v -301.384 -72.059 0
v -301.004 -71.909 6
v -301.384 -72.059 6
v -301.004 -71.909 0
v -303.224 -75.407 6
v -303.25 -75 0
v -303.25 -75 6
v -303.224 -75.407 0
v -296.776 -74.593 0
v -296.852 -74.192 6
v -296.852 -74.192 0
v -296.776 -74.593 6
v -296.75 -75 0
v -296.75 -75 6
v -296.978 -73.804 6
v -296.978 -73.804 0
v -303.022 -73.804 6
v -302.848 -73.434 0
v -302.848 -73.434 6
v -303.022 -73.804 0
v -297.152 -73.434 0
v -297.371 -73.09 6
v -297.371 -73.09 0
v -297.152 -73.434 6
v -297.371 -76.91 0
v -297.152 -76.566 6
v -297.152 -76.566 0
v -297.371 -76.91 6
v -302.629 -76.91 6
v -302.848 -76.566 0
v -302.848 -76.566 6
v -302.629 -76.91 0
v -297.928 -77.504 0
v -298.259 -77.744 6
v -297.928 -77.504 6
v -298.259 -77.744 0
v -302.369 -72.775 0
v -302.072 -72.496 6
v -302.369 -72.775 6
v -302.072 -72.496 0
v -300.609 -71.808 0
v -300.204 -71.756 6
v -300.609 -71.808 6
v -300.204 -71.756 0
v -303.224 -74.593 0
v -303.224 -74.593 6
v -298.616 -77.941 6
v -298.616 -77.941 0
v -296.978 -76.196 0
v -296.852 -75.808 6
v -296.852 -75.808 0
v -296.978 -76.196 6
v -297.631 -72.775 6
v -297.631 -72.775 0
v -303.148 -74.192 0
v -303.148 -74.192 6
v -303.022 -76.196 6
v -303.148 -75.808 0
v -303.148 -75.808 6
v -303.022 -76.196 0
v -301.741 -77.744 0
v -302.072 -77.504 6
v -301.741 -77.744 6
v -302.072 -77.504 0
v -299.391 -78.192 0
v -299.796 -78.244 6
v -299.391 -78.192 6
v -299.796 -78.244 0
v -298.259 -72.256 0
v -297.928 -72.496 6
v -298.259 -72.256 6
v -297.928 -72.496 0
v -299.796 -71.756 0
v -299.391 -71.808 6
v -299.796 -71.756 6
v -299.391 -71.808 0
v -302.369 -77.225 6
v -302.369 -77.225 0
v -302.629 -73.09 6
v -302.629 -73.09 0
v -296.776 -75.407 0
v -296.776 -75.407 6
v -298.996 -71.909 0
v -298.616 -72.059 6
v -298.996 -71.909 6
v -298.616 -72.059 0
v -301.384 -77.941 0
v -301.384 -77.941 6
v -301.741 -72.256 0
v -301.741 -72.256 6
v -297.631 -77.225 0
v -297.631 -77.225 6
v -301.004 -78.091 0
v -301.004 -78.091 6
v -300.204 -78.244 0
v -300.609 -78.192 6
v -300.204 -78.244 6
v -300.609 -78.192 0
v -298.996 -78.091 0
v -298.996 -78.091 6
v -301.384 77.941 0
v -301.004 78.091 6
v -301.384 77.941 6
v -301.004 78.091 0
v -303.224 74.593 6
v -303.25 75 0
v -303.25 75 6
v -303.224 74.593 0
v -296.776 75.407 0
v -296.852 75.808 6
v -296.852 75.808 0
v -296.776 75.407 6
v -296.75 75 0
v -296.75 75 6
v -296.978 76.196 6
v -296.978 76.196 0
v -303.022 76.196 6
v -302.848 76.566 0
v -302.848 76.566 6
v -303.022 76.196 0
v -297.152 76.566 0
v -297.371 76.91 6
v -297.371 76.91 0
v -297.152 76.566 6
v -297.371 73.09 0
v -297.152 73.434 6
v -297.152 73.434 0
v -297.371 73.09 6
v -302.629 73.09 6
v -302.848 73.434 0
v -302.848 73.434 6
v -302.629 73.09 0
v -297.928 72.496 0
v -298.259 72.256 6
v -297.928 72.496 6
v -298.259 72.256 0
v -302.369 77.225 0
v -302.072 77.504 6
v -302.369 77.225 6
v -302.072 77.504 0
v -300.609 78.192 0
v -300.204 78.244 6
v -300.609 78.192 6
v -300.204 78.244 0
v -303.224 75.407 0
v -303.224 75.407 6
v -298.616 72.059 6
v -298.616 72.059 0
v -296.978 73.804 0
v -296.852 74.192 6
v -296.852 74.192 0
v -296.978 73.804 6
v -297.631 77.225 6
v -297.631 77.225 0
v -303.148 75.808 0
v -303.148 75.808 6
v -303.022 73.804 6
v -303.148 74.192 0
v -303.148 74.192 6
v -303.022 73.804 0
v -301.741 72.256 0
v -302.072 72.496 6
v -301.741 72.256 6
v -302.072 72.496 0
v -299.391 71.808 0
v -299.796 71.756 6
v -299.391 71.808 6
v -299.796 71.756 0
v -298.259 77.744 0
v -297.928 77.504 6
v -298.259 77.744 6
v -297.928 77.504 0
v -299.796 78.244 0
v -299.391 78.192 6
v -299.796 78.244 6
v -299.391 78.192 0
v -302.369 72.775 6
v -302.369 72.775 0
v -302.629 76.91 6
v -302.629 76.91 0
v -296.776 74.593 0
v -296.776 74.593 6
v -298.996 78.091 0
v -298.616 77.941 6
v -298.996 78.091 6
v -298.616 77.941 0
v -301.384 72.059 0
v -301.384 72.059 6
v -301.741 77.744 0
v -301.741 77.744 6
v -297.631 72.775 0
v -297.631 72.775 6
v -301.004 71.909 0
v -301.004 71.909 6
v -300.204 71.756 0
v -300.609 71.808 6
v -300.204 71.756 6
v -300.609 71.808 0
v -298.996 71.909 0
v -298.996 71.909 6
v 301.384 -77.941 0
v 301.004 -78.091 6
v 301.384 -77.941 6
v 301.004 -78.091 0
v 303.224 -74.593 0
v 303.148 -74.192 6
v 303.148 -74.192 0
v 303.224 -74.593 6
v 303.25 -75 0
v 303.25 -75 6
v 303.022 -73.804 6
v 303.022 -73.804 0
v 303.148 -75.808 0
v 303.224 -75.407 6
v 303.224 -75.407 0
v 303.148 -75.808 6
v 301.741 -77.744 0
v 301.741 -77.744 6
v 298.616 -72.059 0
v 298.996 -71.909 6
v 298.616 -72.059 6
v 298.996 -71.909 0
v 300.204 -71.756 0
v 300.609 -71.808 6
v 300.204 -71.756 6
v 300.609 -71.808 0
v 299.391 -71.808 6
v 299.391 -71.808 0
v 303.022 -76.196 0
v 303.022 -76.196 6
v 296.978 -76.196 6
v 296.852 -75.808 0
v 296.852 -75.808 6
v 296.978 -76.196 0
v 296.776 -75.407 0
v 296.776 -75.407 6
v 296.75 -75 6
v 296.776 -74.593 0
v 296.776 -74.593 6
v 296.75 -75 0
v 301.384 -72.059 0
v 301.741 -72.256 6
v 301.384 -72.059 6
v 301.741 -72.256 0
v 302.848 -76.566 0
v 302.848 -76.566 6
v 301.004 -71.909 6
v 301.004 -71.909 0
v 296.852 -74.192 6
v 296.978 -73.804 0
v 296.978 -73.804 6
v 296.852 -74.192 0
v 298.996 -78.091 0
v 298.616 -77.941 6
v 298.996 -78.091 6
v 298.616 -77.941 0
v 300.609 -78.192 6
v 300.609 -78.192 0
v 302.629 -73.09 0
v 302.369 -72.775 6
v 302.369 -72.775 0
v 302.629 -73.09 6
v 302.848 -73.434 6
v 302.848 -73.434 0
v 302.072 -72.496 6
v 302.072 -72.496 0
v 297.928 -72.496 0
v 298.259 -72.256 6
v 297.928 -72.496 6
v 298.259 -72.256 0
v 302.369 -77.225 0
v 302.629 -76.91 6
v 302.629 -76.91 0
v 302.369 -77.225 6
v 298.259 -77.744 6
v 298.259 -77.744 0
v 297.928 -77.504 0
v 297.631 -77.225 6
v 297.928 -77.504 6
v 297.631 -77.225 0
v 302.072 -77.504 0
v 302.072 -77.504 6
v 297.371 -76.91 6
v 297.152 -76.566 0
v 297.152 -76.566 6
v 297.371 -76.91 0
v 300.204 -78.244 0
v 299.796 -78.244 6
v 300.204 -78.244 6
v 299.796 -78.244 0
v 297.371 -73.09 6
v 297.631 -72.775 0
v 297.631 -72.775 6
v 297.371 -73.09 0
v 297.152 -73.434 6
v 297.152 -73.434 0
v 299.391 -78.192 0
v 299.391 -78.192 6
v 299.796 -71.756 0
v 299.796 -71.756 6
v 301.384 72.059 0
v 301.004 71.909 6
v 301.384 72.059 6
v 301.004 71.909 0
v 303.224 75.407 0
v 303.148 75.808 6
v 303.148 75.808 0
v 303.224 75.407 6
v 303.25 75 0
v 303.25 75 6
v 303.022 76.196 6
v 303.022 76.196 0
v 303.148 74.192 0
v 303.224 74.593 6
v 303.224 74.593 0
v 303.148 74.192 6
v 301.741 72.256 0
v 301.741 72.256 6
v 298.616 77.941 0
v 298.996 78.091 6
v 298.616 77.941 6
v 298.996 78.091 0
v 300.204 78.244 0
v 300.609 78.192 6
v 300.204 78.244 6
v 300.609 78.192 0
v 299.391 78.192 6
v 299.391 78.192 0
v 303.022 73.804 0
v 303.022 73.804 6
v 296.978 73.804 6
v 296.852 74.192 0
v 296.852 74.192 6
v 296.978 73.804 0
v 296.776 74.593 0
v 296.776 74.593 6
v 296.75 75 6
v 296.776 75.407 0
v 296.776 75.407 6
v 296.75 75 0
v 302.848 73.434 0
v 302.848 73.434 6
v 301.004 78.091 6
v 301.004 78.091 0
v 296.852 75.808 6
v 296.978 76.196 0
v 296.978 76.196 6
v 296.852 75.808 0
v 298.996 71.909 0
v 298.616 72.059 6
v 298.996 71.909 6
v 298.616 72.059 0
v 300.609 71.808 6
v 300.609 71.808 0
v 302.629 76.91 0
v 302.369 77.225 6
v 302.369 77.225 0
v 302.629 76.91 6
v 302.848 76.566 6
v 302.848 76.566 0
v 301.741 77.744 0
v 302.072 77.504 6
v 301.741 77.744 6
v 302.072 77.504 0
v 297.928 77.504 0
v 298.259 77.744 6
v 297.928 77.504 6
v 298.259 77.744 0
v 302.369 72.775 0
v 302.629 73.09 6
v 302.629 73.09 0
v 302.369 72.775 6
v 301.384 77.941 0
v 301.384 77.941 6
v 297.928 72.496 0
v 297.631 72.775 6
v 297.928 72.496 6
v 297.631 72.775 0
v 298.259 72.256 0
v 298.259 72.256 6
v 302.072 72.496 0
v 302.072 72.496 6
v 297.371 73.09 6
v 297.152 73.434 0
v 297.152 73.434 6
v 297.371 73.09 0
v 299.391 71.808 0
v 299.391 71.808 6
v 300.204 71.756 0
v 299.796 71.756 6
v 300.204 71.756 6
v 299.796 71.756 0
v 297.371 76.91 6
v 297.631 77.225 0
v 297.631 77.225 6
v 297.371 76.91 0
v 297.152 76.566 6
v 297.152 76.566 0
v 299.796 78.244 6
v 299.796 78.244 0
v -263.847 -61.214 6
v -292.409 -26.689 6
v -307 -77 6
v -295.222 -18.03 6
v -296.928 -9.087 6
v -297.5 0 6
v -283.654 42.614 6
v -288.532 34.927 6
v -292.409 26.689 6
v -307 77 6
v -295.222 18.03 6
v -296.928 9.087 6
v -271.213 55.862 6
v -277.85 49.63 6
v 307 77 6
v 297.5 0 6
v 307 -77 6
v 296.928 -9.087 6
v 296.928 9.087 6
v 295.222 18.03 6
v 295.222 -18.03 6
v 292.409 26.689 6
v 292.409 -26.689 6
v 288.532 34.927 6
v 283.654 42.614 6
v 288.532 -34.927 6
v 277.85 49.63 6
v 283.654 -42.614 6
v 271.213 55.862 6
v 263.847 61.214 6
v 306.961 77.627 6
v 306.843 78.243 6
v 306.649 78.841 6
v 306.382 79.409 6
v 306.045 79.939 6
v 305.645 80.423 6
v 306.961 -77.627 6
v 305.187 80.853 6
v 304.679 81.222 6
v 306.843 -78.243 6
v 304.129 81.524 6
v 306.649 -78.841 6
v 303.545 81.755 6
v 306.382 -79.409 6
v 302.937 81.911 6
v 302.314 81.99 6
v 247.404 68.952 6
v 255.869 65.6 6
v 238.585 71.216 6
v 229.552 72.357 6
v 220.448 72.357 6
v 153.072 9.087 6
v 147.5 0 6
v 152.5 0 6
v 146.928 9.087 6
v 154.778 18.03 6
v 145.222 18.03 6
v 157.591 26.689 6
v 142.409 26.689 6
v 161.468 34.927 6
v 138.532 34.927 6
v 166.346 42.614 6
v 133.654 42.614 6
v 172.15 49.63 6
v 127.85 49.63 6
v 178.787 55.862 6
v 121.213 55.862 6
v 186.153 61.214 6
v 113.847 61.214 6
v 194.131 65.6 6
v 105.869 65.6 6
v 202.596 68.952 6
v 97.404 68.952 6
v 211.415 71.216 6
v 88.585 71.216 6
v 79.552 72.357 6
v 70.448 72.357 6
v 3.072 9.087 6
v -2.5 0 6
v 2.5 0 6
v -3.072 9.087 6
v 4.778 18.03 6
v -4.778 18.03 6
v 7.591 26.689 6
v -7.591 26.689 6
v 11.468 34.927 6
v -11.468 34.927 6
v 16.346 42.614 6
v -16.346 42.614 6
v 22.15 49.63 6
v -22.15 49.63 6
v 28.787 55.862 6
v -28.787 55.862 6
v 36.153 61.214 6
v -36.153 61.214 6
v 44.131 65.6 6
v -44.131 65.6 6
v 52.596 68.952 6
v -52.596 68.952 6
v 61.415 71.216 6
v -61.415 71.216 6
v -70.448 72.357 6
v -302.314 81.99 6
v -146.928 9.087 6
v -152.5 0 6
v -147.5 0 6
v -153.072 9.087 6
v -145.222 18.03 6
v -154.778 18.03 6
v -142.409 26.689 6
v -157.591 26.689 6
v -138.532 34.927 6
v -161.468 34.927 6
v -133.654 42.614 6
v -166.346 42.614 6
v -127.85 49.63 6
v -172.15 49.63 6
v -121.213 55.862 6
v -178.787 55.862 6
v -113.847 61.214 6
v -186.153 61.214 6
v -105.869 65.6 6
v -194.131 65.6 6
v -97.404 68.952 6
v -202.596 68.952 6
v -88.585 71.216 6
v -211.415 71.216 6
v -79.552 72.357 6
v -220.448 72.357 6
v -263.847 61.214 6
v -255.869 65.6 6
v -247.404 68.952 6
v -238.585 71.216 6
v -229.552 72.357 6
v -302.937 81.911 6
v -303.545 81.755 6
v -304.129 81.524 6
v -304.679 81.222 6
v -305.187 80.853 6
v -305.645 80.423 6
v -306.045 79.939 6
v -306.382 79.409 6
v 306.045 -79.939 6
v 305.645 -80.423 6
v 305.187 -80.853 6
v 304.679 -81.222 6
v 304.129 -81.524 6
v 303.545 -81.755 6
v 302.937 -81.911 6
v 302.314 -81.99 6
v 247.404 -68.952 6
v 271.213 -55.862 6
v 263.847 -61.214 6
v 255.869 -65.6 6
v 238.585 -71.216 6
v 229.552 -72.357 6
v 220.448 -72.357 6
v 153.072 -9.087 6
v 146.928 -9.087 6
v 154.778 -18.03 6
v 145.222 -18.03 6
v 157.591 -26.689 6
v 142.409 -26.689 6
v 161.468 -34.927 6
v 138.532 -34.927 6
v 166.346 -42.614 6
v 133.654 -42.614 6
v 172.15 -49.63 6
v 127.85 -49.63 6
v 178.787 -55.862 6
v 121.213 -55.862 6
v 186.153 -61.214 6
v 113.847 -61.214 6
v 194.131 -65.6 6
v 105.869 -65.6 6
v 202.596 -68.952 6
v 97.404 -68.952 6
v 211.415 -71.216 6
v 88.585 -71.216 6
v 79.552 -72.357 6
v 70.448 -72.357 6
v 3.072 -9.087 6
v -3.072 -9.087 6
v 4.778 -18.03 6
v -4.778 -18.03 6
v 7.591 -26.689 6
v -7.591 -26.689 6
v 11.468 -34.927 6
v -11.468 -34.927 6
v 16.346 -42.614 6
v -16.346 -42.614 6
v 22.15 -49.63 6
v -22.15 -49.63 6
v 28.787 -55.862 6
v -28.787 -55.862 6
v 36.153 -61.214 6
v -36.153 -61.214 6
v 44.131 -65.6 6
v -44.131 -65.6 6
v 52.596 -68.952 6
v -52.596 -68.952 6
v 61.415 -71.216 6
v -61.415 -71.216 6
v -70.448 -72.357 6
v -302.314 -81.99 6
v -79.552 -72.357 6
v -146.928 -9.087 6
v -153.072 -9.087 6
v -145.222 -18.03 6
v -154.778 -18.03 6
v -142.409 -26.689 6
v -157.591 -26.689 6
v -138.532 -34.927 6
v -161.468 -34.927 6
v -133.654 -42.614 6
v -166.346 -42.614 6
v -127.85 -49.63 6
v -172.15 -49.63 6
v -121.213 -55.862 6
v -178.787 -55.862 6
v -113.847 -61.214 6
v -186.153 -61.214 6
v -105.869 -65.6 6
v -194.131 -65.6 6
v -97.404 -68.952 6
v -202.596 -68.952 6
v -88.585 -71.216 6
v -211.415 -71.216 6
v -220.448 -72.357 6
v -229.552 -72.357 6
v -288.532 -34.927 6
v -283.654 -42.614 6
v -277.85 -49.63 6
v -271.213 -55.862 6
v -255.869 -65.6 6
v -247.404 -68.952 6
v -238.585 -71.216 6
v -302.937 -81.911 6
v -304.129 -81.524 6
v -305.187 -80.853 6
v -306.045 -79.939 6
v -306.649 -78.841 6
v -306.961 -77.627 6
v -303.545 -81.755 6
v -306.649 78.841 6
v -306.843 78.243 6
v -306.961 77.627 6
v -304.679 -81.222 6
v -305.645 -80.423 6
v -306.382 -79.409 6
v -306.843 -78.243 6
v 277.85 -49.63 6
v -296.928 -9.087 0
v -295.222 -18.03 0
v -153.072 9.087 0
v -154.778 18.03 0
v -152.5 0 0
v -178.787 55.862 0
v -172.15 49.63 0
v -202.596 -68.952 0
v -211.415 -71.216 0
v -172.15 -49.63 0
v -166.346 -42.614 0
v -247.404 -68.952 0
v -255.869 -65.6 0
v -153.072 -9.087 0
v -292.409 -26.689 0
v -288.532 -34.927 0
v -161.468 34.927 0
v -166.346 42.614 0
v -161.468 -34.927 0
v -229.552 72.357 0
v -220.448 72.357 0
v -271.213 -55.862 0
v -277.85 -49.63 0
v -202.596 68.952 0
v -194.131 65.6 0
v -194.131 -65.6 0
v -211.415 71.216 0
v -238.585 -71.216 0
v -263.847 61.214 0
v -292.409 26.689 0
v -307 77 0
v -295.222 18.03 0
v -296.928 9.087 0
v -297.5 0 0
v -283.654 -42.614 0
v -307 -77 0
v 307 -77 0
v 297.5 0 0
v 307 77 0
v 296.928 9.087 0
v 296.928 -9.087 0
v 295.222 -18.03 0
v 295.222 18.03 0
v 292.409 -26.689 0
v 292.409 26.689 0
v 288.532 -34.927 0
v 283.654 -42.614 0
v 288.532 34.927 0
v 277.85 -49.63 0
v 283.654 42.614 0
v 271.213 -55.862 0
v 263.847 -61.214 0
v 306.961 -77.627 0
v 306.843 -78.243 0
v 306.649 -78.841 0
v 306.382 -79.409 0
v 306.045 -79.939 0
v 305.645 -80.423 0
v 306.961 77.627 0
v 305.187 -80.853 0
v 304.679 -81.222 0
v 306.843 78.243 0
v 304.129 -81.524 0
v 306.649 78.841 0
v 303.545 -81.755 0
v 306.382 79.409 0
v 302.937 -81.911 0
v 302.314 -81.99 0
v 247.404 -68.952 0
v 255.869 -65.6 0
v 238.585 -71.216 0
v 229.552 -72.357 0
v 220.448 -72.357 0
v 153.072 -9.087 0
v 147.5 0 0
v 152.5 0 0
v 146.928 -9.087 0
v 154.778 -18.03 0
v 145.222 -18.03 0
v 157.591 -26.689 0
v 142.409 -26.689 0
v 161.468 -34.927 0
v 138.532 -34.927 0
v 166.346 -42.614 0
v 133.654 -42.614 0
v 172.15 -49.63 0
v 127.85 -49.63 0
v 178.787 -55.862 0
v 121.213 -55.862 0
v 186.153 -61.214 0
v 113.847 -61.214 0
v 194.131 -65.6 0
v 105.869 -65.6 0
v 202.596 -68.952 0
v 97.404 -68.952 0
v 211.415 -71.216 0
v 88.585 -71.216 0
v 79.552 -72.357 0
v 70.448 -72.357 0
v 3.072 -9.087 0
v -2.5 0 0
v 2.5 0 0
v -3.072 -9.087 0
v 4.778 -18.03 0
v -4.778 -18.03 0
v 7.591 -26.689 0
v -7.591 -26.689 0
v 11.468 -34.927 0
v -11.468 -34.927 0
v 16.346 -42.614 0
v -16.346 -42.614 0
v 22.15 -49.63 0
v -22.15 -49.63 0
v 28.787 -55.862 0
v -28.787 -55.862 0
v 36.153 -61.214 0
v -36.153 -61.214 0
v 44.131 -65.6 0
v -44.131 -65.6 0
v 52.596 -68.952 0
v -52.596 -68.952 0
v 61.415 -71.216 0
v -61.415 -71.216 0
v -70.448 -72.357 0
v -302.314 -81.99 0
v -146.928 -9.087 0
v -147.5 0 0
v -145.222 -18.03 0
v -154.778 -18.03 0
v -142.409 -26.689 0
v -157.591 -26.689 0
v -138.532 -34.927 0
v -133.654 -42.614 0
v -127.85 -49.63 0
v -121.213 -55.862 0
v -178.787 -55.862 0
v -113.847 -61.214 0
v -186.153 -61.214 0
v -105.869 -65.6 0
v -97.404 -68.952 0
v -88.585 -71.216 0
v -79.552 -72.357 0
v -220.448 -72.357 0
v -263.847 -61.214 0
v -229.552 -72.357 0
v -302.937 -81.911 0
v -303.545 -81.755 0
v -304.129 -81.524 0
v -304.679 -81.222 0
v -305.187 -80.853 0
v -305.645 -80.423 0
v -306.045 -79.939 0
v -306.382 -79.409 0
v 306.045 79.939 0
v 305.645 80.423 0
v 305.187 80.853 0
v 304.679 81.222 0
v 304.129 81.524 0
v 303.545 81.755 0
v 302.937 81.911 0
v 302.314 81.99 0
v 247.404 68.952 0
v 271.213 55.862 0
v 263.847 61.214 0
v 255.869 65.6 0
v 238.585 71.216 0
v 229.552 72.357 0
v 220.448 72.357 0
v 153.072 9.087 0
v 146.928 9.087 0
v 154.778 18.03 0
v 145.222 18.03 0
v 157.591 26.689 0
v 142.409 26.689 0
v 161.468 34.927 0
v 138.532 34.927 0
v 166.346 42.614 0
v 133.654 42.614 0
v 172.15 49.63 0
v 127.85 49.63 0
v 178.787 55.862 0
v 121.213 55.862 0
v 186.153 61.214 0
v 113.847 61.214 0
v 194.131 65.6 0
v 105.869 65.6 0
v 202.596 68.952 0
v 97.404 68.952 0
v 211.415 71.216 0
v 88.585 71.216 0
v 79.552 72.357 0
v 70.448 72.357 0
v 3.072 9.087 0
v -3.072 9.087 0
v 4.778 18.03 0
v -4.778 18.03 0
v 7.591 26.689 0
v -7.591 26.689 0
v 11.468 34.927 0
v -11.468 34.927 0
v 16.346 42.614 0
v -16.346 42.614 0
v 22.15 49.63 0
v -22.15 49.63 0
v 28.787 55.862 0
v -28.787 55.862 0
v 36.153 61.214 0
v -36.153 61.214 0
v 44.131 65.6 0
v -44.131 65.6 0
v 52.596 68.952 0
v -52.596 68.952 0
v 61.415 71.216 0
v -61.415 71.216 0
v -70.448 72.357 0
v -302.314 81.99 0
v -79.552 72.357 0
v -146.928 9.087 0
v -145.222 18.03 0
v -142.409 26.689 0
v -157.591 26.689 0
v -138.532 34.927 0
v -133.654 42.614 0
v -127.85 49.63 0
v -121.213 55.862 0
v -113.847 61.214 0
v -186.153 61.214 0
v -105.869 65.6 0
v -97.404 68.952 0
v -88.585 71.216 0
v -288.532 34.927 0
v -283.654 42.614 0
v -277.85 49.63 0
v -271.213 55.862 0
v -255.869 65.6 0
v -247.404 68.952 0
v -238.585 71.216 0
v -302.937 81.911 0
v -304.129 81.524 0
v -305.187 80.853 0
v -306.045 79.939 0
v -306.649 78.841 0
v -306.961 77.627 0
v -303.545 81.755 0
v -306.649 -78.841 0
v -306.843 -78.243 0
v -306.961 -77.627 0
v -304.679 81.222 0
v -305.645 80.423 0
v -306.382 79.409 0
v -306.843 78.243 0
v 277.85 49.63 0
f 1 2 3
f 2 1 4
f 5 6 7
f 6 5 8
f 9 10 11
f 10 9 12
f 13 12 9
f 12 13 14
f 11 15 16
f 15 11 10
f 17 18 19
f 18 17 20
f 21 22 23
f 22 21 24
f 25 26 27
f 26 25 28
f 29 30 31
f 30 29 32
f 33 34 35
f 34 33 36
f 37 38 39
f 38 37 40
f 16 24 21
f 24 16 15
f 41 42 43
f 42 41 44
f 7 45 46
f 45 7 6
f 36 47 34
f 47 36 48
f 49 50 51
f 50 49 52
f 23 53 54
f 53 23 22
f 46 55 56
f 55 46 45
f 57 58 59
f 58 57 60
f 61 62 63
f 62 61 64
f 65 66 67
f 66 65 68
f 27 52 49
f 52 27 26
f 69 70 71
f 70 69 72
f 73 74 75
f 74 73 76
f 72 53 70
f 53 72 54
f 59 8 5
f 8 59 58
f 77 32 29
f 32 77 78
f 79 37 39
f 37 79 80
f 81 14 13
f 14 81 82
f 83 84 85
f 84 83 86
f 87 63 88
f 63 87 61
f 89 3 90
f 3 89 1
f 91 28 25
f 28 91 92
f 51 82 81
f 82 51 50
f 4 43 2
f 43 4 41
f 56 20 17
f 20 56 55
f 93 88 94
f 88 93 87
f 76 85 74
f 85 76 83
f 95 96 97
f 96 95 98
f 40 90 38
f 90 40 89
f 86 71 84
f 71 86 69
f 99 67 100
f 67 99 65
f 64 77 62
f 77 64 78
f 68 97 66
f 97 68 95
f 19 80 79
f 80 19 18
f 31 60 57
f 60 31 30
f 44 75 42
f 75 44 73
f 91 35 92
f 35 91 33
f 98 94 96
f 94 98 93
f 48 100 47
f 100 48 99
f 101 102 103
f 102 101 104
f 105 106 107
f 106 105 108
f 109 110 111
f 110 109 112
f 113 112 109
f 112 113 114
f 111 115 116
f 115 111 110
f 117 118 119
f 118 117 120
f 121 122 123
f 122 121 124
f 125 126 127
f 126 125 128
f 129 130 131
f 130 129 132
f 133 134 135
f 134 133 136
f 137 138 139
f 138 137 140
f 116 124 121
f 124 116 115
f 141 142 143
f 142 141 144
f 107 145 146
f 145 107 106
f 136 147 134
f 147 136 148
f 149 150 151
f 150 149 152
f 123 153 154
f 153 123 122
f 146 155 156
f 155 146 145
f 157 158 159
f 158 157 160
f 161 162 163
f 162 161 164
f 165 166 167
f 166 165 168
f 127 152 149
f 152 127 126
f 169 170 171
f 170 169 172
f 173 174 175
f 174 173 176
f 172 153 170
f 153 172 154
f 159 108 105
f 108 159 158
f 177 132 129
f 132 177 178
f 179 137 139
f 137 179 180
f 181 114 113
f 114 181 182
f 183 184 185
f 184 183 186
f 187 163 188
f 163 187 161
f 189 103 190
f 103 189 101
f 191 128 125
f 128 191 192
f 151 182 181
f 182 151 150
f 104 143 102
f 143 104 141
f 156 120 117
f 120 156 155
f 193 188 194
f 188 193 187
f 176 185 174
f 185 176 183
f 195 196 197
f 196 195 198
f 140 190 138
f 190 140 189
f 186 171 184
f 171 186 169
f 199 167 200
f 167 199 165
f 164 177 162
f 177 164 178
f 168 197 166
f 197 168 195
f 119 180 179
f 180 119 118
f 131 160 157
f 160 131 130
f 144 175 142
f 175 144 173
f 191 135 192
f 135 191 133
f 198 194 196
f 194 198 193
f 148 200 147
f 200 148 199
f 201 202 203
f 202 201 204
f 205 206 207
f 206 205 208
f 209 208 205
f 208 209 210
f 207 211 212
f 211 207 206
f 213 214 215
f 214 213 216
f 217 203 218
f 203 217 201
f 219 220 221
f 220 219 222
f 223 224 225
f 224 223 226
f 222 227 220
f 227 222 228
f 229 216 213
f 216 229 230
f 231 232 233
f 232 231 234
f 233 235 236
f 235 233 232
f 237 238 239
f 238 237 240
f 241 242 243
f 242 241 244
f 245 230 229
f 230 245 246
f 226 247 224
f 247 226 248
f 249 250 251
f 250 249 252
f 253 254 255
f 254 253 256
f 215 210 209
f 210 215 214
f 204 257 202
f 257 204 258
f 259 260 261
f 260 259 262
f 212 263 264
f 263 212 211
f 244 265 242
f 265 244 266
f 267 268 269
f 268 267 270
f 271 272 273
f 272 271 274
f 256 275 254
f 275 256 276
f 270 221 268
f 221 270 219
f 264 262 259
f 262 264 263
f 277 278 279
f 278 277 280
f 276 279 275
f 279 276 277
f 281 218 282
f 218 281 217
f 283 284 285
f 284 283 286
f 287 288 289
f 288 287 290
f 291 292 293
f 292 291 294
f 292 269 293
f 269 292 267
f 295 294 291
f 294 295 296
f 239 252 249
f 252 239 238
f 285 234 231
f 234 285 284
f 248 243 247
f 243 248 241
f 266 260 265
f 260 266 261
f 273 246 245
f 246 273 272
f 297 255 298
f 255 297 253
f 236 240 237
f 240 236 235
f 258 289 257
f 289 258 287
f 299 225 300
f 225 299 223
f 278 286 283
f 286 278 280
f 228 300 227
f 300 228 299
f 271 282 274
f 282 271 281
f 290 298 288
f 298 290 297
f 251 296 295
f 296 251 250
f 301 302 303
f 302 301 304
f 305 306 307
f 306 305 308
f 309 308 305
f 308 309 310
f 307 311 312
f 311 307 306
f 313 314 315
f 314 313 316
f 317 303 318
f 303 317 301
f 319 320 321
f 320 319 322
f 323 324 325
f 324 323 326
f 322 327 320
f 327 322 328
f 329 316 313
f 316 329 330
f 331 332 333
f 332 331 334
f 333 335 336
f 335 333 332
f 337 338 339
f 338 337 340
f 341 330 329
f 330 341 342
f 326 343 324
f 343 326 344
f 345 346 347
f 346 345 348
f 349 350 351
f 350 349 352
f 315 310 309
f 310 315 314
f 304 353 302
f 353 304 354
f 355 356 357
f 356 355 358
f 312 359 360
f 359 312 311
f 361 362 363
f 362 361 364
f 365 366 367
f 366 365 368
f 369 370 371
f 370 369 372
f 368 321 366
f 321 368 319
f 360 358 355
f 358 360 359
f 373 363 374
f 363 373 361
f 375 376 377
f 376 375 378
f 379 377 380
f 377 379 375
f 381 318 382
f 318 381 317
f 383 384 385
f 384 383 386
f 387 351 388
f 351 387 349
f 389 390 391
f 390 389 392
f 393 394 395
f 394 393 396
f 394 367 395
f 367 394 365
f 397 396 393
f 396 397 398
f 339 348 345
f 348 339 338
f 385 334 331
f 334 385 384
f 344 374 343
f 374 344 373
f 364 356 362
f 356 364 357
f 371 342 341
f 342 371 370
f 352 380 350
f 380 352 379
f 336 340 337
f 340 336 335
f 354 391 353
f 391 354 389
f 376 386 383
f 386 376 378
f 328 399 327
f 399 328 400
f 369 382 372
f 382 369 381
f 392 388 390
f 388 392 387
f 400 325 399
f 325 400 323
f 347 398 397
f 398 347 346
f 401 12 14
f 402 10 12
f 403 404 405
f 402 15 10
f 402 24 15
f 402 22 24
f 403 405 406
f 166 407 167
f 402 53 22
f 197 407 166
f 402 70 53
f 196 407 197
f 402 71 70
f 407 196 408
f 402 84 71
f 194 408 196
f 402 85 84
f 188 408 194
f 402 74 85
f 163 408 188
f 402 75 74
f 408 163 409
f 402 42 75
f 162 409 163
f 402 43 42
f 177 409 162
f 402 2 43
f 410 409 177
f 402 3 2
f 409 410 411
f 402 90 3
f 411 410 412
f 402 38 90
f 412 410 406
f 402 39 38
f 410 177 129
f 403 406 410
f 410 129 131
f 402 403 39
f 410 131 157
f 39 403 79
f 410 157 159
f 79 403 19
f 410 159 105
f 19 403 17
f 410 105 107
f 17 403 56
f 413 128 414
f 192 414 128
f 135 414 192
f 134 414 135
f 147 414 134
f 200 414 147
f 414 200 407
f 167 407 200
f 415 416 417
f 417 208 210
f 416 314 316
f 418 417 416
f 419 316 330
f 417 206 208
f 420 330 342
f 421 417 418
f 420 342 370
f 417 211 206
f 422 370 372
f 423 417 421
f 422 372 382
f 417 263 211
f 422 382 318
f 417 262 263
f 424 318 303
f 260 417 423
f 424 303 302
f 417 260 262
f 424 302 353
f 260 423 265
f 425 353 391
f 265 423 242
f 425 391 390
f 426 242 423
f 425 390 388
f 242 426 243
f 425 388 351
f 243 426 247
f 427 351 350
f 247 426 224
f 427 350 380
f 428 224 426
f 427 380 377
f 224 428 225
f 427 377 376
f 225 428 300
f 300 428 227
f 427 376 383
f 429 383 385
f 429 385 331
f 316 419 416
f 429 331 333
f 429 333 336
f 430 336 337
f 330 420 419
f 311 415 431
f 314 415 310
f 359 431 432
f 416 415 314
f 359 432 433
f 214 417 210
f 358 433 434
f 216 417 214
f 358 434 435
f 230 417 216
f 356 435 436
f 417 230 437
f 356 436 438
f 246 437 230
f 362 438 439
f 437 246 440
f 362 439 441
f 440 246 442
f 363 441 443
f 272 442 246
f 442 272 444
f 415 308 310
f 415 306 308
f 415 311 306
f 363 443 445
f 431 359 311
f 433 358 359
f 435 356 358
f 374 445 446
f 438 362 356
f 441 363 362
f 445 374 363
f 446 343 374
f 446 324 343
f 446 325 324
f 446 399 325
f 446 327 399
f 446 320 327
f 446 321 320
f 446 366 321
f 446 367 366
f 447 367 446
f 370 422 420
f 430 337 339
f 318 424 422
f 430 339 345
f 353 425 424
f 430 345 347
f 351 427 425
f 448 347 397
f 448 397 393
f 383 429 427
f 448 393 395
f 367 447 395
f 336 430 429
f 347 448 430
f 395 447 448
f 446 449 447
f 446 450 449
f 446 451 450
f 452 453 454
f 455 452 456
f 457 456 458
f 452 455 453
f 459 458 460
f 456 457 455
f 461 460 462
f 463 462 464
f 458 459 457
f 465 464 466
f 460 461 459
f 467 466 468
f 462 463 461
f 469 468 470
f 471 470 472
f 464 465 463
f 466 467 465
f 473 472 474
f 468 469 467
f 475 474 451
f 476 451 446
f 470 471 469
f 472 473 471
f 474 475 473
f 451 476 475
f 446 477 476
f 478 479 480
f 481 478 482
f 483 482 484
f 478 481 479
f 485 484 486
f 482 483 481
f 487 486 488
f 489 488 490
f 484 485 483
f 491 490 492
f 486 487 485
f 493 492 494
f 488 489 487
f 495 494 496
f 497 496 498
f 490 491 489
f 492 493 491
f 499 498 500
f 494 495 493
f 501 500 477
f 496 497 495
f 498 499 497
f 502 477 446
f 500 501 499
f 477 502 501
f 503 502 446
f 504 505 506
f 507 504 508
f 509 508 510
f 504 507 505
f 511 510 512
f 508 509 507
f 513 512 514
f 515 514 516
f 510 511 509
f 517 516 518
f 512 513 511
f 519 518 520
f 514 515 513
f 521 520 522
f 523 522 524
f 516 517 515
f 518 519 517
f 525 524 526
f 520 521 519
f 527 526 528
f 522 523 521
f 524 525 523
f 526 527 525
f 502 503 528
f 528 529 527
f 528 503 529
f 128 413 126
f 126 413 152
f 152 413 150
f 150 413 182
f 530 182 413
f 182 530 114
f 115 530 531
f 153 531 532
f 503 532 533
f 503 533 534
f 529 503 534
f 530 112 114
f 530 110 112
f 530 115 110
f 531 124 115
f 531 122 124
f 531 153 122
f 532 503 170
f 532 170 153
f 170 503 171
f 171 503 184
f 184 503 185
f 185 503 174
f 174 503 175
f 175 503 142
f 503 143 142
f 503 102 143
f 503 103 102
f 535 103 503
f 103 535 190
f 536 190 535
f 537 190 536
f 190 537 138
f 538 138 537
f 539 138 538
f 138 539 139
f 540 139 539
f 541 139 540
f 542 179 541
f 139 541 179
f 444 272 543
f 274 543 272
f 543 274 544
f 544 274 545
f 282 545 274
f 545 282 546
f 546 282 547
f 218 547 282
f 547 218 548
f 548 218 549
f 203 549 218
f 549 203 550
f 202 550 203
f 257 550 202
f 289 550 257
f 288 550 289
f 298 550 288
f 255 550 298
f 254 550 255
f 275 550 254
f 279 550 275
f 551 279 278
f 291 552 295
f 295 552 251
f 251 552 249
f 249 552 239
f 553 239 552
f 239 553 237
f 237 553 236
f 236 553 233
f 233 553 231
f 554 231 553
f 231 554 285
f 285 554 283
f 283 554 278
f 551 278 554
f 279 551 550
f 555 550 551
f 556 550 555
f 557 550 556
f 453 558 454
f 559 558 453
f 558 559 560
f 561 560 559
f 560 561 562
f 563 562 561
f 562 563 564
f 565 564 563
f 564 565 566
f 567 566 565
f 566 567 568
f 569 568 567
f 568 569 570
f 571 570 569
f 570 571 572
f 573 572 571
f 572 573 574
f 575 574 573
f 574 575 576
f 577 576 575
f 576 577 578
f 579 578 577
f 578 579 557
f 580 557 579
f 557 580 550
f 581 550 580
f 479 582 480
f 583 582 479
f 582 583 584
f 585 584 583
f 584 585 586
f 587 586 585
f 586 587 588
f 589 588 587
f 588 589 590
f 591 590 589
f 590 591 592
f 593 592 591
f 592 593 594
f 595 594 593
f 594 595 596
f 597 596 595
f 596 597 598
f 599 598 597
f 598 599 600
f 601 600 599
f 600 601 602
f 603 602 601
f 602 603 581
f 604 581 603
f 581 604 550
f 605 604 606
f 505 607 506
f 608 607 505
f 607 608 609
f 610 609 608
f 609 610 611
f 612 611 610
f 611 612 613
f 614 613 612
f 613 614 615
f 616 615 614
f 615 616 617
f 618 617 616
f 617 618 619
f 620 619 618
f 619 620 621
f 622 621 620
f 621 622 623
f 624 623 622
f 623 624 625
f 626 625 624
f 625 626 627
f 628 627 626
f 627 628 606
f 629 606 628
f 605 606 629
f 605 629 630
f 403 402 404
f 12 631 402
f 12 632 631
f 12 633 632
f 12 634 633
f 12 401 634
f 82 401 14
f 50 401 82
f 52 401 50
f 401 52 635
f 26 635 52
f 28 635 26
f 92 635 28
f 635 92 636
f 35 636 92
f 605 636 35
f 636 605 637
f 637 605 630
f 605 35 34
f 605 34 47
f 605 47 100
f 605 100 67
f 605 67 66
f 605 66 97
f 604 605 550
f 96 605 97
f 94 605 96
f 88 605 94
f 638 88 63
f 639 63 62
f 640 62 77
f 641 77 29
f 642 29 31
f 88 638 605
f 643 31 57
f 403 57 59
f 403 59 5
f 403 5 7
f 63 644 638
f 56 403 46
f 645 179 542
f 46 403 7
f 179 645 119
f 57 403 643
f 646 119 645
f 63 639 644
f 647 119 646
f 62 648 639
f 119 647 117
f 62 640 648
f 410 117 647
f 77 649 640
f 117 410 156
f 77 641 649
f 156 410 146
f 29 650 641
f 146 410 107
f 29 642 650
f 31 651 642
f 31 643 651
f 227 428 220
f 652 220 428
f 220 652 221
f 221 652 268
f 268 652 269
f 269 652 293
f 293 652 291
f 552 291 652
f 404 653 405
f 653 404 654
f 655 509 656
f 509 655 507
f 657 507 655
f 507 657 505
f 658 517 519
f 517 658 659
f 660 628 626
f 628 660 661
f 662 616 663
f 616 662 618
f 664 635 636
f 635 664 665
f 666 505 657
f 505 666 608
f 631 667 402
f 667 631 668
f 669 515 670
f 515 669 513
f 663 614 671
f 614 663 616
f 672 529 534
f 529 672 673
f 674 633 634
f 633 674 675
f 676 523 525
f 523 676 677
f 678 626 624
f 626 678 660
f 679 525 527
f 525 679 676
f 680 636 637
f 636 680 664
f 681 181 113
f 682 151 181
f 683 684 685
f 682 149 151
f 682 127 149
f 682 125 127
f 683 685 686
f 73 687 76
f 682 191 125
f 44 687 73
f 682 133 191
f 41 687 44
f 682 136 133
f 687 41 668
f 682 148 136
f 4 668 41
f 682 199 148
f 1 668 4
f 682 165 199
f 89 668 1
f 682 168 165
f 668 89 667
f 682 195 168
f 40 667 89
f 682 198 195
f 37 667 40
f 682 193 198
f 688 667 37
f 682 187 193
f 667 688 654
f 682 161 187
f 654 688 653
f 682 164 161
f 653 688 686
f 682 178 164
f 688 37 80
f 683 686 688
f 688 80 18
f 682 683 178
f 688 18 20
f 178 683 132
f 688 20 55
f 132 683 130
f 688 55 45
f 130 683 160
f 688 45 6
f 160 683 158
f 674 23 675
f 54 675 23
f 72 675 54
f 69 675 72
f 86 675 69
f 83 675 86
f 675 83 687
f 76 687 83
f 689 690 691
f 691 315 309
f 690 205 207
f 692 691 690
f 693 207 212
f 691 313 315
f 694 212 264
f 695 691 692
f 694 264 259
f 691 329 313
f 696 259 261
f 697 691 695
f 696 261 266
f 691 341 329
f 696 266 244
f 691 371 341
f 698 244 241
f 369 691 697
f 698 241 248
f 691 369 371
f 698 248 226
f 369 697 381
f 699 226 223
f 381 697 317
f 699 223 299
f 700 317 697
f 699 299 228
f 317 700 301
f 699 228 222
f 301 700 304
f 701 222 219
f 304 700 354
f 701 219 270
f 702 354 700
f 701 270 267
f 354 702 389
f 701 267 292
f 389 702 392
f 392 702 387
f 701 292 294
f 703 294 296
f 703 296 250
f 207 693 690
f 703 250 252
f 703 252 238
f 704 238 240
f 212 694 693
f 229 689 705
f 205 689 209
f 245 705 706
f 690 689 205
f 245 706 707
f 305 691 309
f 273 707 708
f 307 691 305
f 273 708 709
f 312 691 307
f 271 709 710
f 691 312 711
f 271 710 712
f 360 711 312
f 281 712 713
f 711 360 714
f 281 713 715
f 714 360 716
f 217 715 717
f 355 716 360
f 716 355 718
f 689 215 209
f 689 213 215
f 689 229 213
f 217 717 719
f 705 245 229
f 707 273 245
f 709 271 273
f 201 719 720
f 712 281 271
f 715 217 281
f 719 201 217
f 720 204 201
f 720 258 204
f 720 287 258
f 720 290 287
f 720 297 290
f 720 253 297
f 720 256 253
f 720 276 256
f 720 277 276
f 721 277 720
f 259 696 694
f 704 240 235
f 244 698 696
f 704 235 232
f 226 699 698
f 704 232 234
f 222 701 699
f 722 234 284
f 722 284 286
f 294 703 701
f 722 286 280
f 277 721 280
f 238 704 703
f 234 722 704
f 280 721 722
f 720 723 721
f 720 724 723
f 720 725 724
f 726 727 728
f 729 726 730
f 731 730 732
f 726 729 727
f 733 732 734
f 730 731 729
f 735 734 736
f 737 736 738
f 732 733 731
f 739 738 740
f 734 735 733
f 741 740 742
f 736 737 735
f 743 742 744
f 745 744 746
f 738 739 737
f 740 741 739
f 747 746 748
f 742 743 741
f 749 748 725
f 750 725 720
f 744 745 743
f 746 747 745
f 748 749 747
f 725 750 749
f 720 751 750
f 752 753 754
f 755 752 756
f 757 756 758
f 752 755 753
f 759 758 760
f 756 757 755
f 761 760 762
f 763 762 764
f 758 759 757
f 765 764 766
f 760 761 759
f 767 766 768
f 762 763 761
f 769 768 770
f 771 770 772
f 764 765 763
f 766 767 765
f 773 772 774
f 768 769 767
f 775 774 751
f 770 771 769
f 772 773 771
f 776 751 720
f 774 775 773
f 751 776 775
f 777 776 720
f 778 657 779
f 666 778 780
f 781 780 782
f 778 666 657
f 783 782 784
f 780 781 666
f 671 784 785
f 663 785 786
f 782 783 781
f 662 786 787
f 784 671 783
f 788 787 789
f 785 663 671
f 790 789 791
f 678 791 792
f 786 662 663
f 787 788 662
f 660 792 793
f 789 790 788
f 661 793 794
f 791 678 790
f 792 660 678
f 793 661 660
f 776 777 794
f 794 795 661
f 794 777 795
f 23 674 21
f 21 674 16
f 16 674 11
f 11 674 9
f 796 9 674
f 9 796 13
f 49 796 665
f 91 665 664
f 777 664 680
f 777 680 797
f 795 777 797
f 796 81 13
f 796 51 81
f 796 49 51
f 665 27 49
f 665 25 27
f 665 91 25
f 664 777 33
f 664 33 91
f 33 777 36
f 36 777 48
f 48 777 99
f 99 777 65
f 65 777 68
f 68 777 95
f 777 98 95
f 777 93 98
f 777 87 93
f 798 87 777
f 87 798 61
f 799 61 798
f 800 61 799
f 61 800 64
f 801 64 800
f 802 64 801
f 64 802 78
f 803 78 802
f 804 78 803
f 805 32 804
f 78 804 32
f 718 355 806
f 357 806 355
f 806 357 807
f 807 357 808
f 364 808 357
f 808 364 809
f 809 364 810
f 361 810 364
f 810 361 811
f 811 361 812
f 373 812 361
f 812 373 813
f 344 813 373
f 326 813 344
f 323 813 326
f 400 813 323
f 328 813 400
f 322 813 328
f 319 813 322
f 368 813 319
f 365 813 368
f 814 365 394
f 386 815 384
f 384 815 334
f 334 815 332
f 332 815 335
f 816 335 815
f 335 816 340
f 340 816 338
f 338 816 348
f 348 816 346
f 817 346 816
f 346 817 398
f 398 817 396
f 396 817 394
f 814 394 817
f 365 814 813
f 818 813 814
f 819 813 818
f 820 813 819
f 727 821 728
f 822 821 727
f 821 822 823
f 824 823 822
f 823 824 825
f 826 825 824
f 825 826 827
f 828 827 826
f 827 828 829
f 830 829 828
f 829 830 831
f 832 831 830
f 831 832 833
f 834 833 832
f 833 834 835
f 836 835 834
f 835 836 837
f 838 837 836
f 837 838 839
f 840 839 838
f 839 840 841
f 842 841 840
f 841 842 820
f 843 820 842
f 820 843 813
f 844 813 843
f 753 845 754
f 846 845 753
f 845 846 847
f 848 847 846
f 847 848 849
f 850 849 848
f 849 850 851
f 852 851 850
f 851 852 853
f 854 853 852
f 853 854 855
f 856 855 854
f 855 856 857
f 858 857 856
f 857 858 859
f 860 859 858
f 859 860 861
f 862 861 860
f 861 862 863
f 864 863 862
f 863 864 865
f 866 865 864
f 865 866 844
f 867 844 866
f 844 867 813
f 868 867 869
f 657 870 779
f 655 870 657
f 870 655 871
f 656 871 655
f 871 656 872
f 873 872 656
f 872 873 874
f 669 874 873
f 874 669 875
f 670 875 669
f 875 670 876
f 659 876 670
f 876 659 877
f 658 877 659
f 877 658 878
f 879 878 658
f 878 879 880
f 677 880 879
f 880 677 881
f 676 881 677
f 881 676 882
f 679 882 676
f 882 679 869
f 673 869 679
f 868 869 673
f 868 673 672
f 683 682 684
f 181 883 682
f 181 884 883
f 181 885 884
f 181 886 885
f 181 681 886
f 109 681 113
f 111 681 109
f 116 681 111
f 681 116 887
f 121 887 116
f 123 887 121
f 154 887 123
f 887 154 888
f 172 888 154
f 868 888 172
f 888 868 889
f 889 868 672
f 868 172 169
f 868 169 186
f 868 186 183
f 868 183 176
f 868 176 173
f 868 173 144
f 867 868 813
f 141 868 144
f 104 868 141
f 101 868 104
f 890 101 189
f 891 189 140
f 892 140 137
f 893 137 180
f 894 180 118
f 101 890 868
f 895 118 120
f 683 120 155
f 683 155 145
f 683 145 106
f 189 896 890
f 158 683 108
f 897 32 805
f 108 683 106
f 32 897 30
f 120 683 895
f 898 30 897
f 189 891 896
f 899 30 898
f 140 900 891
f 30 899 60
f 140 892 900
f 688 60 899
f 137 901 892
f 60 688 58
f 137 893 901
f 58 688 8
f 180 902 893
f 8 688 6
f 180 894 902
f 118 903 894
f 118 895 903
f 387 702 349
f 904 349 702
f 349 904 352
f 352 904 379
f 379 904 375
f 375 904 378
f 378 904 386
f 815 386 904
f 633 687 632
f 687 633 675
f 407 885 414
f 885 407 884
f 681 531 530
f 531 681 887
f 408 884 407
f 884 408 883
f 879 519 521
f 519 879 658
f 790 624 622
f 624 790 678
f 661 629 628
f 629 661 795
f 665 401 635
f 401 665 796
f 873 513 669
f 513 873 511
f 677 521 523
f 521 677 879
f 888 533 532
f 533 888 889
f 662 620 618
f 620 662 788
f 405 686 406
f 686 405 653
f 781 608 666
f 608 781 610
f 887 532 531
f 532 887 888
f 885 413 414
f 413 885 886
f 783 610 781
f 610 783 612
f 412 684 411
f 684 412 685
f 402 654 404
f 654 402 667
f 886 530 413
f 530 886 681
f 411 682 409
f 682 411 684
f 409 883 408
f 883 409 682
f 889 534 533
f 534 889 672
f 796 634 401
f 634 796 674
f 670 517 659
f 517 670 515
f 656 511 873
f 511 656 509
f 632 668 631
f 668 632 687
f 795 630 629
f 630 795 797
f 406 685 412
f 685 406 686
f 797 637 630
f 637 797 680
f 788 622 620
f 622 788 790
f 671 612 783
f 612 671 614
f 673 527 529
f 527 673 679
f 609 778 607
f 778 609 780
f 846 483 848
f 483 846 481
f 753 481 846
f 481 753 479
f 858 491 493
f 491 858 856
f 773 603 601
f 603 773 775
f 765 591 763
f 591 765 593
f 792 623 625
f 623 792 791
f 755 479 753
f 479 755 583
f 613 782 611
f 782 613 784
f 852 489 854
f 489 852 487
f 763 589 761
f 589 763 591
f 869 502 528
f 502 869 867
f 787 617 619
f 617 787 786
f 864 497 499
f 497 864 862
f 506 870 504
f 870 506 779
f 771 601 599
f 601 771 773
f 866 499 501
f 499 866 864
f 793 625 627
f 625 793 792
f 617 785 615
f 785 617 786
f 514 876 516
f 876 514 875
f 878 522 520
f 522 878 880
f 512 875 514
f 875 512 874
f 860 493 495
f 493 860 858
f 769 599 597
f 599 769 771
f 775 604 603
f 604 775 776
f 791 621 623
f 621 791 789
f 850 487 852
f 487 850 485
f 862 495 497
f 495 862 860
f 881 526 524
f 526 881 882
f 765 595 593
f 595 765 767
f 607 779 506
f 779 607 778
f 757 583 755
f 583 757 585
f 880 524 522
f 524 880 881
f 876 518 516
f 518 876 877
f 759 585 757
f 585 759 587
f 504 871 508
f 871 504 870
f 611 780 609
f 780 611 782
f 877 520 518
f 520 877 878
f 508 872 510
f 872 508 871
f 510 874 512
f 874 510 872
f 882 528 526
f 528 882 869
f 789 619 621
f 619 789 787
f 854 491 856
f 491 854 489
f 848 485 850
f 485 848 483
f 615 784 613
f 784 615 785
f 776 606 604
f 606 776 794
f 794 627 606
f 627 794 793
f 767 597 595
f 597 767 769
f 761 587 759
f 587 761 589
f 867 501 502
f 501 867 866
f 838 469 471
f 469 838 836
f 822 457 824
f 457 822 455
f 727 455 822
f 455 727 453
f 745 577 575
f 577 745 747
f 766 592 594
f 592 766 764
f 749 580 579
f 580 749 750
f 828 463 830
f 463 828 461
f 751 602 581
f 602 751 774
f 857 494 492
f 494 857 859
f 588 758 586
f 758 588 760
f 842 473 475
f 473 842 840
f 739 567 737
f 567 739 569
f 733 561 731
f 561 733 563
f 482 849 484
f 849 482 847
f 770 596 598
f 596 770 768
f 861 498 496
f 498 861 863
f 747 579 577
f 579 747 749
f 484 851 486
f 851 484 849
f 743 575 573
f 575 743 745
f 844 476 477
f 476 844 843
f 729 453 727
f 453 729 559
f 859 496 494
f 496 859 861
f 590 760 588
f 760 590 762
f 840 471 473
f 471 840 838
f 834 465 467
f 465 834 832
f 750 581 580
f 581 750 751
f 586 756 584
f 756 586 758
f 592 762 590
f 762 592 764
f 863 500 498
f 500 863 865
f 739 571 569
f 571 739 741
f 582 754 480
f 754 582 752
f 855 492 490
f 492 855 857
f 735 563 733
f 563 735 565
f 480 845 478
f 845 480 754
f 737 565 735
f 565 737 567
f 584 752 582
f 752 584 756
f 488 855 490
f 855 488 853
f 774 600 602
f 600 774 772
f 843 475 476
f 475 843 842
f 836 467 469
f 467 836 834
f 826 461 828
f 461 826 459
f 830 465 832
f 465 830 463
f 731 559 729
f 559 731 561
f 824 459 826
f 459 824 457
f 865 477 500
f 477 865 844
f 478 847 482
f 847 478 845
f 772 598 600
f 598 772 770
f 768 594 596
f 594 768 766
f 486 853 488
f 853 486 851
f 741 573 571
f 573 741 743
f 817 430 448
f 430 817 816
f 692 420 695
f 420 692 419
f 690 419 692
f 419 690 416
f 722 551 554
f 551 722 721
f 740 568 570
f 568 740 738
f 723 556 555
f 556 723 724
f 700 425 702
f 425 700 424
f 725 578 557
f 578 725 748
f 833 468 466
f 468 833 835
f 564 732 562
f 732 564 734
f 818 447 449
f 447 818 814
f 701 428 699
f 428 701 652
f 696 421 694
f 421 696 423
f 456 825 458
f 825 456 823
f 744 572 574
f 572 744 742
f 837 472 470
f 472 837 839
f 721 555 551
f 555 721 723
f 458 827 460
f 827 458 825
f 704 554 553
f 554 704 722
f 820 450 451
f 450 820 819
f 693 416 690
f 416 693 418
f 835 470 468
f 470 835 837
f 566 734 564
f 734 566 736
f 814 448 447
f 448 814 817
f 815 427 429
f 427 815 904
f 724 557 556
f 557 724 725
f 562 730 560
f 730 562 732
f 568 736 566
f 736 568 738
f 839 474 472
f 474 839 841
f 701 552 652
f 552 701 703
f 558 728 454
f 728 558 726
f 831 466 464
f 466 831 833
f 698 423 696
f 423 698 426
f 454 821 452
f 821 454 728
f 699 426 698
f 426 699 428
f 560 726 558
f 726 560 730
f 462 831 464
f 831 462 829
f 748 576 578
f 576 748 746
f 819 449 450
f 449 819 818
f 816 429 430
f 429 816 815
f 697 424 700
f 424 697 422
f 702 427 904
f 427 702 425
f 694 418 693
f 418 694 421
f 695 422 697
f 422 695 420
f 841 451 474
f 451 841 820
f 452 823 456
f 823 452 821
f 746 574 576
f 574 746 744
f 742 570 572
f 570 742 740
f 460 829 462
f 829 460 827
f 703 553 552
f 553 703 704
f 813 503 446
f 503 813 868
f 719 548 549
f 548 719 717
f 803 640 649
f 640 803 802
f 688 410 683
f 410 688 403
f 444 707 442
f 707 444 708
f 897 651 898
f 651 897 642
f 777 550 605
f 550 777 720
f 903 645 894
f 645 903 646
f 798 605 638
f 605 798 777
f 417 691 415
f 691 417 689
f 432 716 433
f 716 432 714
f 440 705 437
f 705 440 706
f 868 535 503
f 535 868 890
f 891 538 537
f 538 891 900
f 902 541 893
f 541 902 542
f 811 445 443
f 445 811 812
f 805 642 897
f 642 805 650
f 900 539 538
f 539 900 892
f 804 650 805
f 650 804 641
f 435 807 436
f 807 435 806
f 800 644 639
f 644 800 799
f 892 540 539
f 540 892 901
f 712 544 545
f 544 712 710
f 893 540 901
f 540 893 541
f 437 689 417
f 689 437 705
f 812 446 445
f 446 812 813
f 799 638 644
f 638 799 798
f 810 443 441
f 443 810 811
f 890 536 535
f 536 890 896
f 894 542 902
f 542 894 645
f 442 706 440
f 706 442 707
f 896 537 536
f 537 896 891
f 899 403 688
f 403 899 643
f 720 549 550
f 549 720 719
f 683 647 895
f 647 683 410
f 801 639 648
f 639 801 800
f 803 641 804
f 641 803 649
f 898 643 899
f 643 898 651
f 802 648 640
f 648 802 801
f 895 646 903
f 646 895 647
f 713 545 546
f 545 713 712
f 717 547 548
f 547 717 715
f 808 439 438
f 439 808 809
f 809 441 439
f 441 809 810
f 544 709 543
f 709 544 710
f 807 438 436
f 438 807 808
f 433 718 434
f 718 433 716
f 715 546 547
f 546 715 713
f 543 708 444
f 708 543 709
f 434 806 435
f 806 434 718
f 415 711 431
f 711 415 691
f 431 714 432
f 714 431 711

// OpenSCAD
$fn = 50;


difference() {
	union() {
		hull() {
			translate(v = [-302.0000000000, 77.0000000000, 0]) {
				cylinder(h = 6, r = 5);
			}
			translate(v = [302.0000000000, 77.0000000000, 0]) {
				cylinder(h = 6, r = 5);
			}
			translate(v = [-302.0000000000, -77.0000000000, 0]) {
				cylinder(h = 6, r = 5);
			}
			translate(v = [302.0000000000, -77.0000000000, 0]) {
				cylinder(h = 6, r = 5);
			}
		}
	}
	union() {
		#translate(v = [-300.0000000000, -75.0000000000, -100.0000000000]) {
			cylinder(h = 200, r = 3.2500000000);
		}
		#translate(v = [-300.0000000000, 75.0000000000, -100.0000000000]) {
			cylinder(h = 200, r = 3.2500000000);
		}
		#translate(v = [300.0000000000, -75.0000000000, -100.0000000000]) {
			cylinder(h = 200, r = 3.2500000000);
		}
		#translate(v = [300.0000000000, 75.0000000000, -100.0000000000]) {
			cylinder(h = 200, r = 3.2500000000);
		}
		#translate(v = [-225.0000000000, 0, 0]) {
			cylinder(h = 6, r = 72.5000000000);
		}
		#translate(v = [-75.0000000000, 0, 0]) {
			cylinder(h = 6, r = 72.5000000000);
		}
		#translate(v = [75.0000000000, 0, 0]) {
			cylinder(h = 6, r = 72.5000000000);
		}
		#translate(v = [225.0000000000, 0, 0]) {
			cylinder(h = 6, r = 72.5000000000);
		}
	}
}
